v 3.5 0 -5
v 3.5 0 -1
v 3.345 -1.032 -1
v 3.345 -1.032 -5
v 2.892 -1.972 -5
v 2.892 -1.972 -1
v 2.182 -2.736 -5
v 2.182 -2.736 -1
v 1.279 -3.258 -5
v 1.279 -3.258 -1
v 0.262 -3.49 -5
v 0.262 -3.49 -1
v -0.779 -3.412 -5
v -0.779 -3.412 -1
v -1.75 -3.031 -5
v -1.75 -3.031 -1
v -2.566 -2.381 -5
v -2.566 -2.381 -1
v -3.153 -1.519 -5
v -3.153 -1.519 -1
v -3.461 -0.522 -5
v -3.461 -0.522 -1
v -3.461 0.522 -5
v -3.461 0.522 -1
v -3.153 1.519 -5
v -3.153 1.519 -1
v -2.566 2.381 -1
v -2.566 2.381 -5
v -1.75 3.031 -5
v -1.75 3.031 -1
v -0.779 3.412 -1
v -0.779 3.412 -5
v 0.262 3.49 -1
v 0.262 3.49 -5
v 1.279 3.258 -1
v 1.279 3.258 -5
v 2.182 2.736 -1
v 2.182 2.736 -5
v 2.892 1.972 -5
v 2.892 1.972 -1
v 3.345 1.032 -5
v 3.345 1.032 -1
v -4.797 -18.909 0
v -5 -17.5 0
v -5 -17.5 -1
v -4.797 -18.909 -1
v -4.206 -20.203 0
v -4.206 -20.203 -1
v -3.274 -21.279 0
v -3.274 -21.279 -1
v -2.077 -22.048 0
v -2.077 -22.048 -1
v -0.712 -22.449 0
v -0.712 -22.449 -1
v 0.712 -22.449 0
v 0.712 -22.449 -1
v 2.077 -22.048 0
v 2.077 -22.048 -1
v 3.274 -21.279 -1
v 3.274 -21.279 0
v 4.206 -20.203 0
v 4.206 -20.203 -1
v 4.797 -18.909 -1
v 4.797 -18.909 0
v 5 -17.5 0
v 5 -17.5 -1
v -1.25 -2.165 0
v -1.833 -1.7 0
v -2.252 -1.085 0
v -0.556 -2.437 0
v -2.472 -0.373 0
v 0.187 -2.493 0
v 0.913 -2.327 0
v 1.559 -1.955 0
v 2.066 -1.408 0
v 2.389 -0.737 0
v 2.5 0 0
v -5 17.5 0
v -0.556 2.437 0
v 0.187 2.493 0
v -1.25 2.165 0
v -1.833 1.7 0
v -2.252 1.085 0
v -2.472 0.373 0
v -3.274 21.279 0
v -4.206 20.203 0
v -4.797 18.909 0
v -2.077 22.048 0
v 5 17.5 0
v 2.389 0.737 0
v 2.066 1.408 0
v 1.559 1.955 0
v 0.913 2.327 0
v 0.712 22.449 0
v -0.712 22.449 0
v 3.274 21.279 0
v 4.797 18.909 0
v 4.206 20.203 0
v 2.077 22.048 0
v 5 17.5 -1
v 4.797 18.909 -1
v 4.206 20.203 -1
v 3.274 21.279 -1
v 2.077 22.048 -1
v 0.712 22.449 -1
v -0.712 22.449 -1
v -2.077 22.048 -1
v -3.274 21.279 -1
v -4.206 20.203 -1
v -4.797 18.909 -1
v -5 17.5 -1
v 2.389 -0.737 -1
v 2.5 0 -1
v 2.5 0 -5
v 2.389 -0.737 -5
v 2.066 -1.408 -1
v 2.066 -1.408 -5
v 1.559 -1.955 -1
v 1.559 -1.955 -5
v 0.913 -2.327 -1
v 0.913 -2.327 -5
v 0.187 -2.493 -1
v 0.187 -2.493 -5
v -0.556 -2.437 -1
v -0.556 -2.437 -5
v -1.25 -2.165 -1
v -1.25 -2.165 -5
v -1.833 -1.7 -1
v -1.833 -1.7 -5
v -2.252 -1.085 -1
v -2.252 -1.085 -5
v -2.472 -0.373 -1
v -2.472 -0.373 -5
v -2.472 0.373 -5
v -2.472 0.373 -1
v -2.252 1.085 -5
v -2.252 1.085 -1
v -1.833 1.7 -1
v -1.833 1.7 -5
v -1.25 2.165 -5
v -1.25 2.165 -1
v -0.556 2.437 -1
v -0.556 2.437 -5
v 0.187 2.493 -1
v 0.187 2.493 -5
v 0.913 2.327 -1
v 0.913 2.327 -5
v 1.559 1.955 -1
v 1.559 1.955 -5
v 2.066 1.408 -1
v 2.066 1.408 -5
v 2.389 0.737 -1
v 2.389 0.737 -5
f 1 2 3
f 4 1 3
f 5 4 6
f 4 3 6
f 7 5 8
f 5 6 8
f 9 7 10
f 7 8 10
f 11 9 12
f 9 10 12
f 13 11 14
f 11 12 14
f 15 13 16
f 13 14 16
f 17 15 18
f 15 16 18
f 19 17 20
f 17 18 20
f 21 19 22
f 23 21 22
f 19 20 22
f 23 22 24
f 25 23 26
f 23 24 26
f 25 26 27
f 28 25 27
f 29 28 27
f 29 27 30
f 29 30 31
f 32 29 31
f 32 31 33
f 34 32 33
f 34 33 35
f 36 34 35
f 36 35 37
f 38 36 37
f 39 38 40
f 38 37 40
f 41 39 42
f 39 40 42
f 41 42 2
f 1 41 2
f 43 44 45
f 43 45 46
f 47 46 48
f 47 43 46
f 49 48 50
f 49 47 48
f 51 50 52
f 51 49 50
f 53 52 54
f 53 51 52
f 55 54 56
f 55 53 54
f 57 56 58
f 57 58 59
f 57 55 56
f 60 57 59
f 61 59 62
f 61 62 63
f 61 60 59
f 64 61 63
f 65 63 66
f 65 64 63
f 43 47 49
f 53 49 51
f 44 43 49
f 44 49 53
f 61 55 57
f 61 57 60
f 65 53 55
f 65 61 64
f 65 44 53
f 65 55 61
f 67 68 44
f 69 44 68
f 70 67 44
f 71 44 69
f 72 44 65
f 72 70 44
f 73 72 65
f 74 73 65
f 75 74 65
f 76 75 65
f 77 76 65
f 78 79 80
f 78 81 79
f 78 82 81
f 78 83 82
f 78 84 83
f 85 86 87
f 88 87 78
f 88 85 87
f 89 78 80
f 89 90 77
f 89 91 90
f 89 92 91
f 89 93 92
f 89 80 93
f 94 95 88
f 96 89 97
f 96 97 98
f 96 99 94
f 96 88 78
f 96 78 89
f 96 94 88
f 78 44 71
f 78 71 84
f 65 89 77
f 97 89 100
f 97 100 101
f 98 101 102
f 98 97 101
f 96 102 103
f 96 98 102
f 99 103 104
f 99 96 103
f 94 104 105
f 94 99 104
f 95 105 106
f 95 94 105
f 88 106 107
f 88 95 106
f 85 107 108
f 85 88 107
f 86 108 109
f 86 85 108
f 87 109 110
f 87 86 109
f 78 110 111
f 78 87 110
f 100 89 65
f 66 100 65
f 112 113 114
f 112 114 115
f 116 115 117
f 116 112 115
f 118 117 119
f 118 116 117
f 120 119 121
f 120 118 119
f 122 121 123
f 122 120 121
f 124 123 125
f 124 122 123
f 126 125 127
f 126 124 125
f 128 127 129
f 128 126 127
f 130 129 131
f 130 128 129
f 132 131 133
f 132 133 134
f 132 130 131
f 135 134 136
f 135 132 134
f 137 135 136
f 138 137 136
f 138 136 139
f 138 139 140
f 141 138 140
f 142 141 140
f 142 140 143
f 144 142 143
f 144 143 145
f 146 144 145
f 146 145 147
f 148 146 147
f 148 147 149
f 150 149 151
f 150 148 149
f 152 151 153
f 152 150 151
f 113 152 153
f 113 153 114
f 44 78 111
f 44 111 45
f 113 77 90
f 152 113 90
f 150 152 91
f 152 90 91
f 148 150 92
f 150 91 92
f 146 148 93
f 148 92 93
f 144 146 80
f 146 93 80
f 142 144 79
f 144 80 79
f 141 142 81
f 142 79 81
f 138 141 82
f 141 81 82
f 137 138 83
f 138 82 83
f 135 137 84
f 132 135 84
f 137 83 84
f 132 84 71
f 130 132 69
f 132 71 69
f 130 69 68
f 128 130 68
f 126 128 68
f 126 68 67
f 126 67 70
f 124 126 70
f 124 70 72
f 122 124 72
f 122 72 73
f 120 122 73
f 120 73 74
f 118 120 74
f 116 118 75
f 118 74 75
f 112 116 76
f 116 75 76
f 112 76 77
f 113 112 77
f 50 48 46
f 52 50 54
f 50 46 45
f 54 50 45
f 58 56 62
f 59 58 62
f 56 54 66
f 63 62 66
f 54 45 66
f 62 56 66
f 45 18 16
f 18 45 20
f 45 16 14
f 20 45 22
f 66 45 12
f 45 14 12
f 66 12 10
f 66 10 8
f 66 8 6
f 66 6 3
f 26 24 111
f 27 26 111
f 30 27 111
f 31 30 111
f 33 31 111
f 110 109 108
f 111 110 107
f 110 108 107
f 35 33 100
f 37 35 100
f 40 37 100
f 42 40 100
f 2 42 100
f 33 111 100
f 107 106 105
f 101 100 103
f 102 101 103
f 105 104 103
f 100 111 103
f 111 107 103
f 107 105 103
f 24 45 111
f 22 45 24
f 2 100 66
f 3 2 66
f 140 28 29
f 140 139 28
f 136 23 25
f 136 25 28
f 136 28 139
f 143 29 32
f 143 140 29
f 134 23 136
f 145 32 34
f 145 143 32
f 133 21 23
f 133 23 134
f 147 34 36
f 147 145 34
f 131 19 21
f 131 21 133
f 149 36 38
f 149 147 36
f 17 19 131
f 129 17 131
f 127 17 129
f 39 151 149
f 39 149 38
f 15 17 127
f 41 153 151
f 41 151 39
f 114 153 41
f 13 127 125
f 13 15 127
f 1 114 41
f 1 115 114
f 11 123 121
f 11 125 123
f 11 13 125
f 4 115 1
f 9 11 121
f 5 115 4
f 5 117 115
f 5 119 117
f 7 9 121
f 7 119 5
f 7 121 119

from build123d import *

# Parameters (mm, degrees)
SKETCH_R      = 2.5
PAD_DEPTH     = 1
SKETCH001_R   = 3.5
SKETCH001_R_2 = 2.5
PAD001_DEPTH  = 4


with BuildPart() as part:
    # Sketch → Pad (new body)
    with BuildSketch(Plane.XY):
        with BuildLine():
            ThreePointArc((5, 17.5), (1.3e-05, 22.5), (-5, 17.500026))
            Line((-5, 17.500026), (-5, -17.5))
            ThreePointArc((-5, -17.5), (0, -22.5), (5, -17.5))
            Line((5, 17.5), (5, -17.5))
        make_face()
        Circle(SKETCH_R, mode=Mode.SUBTRACT)
    extrude(amount=-PAD_DEPTH)

    # Sketch001 (on Face7 of Pad) → Pad001 (join)
    with BuildSketch(Plane(origin=(0, 0, -1), x_dir=(1, 0, 0), z_dir=(0, 0, -1))):
        Circle(SKETCH001_R)
        Circle(SKETCH001_R_2, mode=Mode.SUBTRACT)
    extrude(amount=PAD001_DEPTH)


solid = part.part
